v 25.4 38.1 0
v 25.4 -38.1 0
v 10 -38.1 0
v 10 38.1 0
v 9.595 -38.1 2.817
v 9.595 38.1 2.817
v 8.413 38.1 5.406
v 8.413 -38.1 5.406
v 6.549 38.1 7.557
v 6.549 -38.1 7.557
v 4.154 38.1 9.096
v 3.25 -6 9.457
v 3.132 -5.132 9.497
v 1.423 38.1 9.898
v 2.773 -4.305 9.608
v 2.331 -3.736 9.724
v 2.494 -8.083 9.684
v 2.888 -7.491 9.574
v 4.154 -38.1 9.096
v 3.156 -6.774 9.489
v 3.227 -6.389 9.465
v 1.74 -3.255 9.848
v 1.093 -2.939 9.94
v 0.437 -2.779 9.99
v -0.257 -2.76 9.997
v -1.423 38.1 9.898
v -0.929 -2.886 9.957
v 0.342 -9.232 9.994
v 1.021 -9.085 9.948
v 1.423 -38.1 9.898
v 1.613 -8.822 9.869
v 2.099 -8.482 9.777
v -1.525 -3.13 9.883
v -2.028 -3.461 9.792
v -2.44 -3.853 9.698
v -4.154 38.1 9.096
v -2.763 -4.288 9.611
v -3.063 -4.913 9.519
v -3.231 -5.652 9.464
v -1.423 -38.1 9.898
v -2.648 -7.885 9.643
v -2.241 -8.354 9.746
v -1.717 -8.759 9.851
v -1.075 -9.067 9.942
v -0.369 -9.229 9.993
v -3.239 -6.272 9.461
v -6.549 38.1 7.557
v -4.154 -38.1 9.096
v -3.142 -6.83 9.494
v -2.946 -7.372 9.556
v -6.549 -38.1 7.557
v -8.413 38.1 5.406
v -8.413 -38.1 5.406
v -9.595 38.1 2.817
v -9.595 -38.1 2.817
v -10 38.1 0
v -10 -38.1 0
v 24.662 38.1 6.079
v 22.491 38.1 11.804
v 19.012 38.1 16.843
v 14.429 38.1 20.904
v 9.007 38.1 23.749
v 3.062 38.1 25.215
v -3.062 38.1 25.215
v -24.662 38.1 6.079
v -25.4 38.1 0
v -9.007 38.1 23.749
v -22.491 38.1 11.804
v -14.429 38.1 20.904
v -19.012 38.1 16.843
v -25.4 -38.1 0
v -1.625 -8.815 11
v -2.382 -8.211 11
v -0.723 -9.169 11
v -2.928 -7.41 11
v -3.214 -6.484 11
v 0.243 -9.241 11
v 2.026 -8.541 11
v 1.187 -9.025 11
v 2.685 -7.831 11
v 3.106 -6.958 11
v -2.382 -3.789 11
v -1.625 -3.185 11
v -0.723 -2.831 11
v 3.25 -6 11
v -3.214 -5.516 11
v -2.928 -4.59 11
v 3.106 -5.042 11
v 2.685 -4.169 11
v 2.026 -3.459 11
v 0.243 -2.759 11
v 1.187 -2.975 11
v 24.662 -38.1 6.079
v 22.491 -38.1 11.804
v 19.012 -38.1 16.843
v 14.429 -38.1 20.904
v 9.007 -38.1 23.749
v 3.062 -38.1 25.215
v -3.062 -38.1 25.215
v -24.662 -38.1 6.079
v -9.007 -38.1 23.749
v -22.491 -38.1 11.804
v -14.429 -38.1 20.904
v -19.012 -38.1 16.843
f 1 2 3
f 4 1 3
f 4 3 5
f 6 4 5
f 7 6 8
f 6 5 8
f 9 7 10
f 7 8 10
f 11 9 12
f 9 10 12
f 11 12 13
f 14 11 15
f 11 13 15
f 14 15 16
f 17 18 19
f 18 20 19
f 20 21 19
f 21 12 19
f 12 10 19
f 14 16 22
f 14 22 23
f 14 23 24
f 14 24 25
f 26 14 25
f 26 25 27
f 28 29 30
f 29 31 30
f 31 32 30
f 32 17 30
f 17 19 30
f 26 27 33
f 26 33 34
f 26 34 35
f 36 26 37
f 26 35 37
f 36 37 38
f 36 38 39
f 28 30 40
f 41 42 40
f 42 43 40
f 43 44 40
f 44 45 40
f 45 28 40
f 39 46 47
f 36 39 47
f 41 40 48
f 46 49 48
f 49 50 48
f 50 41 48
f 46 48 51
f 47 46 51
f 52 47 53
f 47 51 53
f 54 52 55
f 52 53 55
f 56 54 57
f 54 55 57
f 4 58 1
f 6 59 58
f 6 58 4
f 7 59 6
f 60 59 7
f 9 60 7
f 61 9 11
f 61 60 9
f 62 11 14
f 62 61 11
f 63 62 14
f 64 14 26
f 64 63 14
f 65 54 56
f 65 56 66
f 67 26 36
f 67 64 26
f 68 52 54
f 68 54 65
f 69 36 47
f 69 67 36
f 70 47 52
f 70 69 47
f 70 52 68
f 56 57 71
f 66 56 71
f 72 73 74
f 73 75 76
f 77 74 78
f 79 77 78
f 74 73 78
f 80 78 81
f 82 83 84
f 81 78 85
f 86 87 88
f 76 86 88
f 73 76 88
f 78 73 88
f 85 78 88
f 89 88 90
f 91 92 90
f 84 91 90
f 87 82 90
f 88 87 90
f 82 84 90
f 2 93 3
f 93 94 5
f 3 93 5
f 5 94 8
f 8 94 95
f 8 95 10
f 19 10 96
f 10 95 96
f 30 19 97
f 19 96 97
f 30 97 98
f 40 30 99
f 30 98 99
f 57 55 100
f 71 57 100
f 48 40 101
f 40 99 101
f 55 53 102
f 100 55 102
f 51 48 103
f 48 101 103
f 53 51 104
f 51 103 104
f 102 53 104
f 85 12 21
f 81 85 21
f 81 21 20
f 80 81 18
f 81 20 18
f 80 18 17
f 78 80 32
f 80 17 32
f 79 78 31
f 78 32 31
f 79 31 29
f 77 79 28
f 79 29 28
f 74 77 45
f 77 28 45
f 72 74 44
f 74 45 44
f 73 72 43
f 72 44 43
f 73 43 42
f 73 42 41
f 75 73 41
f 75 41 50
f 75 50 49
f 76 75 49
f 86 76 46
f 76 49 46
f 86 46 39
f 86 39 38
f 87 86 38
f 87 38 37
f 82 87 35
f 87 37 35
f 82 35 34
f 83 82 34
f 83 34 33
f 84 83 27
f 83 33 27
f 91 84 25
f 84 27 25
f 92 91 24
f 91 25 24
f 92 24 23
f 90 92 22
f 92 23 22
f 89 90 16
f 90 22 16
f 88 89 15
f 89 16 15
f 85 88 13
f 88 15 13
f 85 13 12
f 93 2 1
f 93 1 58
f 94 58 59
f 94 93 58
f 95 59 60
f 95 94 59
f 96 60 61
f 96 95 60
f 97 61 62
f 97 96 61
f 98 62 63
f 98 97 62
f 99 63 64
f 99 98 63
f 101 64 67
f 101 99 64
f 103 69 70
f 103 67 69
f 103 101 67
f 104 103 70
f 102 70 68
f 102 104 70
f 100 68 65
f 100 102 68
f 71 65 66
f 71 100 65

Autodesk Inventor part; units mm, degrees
ref_plane "YZ Plane" through (0, 0, 0) normal (1, 0, 0) x (0, 1, 0)
ref_plane "XZ Plane" through (0, 0, 0) normal (0, 1, 0) x (-1, 0, 0)
ref_plane "XY Plane" through (0, 0, 0) normal (0, 0, 1) x (1, 0, 0)
sketch "Sketch1" plane through (0, 0, 0) normal (0, 1, 0) x (-1, 0, 0)
  circle A0 centre (0, 0) radius 25.4
  circle A1 centre (0, 0) radius 10
  line L0 (-25.4, 0) -> (-10, 0)
  line L1 (10, 0) -> (25.4, 0)
  dimension "d0" = 50.8
  dimension "d1" = 20
extrude "Extrusion1" add sketch "Sketch1" along normal mid plane 76.2 contours L1 A1 L0 A0 picked at (-20.0206, 2.0262)
sketch "Sketch2" plane through (0, 0, 0) normal (0, 0, 1) x (1, 0, 0)
  circle A0 centre (0, -6) radius 3.25
  line L0 (46.8316, 0) -> (-44.45, 0)
  point P0 (0, 0)
  dimension "d4" = 6.5
  dimension "d6" = 6
extrude "Extrusion2" cut sketch "Sketch2" along normal blind 11
properties part number "Linear Actuatur piece 2"
